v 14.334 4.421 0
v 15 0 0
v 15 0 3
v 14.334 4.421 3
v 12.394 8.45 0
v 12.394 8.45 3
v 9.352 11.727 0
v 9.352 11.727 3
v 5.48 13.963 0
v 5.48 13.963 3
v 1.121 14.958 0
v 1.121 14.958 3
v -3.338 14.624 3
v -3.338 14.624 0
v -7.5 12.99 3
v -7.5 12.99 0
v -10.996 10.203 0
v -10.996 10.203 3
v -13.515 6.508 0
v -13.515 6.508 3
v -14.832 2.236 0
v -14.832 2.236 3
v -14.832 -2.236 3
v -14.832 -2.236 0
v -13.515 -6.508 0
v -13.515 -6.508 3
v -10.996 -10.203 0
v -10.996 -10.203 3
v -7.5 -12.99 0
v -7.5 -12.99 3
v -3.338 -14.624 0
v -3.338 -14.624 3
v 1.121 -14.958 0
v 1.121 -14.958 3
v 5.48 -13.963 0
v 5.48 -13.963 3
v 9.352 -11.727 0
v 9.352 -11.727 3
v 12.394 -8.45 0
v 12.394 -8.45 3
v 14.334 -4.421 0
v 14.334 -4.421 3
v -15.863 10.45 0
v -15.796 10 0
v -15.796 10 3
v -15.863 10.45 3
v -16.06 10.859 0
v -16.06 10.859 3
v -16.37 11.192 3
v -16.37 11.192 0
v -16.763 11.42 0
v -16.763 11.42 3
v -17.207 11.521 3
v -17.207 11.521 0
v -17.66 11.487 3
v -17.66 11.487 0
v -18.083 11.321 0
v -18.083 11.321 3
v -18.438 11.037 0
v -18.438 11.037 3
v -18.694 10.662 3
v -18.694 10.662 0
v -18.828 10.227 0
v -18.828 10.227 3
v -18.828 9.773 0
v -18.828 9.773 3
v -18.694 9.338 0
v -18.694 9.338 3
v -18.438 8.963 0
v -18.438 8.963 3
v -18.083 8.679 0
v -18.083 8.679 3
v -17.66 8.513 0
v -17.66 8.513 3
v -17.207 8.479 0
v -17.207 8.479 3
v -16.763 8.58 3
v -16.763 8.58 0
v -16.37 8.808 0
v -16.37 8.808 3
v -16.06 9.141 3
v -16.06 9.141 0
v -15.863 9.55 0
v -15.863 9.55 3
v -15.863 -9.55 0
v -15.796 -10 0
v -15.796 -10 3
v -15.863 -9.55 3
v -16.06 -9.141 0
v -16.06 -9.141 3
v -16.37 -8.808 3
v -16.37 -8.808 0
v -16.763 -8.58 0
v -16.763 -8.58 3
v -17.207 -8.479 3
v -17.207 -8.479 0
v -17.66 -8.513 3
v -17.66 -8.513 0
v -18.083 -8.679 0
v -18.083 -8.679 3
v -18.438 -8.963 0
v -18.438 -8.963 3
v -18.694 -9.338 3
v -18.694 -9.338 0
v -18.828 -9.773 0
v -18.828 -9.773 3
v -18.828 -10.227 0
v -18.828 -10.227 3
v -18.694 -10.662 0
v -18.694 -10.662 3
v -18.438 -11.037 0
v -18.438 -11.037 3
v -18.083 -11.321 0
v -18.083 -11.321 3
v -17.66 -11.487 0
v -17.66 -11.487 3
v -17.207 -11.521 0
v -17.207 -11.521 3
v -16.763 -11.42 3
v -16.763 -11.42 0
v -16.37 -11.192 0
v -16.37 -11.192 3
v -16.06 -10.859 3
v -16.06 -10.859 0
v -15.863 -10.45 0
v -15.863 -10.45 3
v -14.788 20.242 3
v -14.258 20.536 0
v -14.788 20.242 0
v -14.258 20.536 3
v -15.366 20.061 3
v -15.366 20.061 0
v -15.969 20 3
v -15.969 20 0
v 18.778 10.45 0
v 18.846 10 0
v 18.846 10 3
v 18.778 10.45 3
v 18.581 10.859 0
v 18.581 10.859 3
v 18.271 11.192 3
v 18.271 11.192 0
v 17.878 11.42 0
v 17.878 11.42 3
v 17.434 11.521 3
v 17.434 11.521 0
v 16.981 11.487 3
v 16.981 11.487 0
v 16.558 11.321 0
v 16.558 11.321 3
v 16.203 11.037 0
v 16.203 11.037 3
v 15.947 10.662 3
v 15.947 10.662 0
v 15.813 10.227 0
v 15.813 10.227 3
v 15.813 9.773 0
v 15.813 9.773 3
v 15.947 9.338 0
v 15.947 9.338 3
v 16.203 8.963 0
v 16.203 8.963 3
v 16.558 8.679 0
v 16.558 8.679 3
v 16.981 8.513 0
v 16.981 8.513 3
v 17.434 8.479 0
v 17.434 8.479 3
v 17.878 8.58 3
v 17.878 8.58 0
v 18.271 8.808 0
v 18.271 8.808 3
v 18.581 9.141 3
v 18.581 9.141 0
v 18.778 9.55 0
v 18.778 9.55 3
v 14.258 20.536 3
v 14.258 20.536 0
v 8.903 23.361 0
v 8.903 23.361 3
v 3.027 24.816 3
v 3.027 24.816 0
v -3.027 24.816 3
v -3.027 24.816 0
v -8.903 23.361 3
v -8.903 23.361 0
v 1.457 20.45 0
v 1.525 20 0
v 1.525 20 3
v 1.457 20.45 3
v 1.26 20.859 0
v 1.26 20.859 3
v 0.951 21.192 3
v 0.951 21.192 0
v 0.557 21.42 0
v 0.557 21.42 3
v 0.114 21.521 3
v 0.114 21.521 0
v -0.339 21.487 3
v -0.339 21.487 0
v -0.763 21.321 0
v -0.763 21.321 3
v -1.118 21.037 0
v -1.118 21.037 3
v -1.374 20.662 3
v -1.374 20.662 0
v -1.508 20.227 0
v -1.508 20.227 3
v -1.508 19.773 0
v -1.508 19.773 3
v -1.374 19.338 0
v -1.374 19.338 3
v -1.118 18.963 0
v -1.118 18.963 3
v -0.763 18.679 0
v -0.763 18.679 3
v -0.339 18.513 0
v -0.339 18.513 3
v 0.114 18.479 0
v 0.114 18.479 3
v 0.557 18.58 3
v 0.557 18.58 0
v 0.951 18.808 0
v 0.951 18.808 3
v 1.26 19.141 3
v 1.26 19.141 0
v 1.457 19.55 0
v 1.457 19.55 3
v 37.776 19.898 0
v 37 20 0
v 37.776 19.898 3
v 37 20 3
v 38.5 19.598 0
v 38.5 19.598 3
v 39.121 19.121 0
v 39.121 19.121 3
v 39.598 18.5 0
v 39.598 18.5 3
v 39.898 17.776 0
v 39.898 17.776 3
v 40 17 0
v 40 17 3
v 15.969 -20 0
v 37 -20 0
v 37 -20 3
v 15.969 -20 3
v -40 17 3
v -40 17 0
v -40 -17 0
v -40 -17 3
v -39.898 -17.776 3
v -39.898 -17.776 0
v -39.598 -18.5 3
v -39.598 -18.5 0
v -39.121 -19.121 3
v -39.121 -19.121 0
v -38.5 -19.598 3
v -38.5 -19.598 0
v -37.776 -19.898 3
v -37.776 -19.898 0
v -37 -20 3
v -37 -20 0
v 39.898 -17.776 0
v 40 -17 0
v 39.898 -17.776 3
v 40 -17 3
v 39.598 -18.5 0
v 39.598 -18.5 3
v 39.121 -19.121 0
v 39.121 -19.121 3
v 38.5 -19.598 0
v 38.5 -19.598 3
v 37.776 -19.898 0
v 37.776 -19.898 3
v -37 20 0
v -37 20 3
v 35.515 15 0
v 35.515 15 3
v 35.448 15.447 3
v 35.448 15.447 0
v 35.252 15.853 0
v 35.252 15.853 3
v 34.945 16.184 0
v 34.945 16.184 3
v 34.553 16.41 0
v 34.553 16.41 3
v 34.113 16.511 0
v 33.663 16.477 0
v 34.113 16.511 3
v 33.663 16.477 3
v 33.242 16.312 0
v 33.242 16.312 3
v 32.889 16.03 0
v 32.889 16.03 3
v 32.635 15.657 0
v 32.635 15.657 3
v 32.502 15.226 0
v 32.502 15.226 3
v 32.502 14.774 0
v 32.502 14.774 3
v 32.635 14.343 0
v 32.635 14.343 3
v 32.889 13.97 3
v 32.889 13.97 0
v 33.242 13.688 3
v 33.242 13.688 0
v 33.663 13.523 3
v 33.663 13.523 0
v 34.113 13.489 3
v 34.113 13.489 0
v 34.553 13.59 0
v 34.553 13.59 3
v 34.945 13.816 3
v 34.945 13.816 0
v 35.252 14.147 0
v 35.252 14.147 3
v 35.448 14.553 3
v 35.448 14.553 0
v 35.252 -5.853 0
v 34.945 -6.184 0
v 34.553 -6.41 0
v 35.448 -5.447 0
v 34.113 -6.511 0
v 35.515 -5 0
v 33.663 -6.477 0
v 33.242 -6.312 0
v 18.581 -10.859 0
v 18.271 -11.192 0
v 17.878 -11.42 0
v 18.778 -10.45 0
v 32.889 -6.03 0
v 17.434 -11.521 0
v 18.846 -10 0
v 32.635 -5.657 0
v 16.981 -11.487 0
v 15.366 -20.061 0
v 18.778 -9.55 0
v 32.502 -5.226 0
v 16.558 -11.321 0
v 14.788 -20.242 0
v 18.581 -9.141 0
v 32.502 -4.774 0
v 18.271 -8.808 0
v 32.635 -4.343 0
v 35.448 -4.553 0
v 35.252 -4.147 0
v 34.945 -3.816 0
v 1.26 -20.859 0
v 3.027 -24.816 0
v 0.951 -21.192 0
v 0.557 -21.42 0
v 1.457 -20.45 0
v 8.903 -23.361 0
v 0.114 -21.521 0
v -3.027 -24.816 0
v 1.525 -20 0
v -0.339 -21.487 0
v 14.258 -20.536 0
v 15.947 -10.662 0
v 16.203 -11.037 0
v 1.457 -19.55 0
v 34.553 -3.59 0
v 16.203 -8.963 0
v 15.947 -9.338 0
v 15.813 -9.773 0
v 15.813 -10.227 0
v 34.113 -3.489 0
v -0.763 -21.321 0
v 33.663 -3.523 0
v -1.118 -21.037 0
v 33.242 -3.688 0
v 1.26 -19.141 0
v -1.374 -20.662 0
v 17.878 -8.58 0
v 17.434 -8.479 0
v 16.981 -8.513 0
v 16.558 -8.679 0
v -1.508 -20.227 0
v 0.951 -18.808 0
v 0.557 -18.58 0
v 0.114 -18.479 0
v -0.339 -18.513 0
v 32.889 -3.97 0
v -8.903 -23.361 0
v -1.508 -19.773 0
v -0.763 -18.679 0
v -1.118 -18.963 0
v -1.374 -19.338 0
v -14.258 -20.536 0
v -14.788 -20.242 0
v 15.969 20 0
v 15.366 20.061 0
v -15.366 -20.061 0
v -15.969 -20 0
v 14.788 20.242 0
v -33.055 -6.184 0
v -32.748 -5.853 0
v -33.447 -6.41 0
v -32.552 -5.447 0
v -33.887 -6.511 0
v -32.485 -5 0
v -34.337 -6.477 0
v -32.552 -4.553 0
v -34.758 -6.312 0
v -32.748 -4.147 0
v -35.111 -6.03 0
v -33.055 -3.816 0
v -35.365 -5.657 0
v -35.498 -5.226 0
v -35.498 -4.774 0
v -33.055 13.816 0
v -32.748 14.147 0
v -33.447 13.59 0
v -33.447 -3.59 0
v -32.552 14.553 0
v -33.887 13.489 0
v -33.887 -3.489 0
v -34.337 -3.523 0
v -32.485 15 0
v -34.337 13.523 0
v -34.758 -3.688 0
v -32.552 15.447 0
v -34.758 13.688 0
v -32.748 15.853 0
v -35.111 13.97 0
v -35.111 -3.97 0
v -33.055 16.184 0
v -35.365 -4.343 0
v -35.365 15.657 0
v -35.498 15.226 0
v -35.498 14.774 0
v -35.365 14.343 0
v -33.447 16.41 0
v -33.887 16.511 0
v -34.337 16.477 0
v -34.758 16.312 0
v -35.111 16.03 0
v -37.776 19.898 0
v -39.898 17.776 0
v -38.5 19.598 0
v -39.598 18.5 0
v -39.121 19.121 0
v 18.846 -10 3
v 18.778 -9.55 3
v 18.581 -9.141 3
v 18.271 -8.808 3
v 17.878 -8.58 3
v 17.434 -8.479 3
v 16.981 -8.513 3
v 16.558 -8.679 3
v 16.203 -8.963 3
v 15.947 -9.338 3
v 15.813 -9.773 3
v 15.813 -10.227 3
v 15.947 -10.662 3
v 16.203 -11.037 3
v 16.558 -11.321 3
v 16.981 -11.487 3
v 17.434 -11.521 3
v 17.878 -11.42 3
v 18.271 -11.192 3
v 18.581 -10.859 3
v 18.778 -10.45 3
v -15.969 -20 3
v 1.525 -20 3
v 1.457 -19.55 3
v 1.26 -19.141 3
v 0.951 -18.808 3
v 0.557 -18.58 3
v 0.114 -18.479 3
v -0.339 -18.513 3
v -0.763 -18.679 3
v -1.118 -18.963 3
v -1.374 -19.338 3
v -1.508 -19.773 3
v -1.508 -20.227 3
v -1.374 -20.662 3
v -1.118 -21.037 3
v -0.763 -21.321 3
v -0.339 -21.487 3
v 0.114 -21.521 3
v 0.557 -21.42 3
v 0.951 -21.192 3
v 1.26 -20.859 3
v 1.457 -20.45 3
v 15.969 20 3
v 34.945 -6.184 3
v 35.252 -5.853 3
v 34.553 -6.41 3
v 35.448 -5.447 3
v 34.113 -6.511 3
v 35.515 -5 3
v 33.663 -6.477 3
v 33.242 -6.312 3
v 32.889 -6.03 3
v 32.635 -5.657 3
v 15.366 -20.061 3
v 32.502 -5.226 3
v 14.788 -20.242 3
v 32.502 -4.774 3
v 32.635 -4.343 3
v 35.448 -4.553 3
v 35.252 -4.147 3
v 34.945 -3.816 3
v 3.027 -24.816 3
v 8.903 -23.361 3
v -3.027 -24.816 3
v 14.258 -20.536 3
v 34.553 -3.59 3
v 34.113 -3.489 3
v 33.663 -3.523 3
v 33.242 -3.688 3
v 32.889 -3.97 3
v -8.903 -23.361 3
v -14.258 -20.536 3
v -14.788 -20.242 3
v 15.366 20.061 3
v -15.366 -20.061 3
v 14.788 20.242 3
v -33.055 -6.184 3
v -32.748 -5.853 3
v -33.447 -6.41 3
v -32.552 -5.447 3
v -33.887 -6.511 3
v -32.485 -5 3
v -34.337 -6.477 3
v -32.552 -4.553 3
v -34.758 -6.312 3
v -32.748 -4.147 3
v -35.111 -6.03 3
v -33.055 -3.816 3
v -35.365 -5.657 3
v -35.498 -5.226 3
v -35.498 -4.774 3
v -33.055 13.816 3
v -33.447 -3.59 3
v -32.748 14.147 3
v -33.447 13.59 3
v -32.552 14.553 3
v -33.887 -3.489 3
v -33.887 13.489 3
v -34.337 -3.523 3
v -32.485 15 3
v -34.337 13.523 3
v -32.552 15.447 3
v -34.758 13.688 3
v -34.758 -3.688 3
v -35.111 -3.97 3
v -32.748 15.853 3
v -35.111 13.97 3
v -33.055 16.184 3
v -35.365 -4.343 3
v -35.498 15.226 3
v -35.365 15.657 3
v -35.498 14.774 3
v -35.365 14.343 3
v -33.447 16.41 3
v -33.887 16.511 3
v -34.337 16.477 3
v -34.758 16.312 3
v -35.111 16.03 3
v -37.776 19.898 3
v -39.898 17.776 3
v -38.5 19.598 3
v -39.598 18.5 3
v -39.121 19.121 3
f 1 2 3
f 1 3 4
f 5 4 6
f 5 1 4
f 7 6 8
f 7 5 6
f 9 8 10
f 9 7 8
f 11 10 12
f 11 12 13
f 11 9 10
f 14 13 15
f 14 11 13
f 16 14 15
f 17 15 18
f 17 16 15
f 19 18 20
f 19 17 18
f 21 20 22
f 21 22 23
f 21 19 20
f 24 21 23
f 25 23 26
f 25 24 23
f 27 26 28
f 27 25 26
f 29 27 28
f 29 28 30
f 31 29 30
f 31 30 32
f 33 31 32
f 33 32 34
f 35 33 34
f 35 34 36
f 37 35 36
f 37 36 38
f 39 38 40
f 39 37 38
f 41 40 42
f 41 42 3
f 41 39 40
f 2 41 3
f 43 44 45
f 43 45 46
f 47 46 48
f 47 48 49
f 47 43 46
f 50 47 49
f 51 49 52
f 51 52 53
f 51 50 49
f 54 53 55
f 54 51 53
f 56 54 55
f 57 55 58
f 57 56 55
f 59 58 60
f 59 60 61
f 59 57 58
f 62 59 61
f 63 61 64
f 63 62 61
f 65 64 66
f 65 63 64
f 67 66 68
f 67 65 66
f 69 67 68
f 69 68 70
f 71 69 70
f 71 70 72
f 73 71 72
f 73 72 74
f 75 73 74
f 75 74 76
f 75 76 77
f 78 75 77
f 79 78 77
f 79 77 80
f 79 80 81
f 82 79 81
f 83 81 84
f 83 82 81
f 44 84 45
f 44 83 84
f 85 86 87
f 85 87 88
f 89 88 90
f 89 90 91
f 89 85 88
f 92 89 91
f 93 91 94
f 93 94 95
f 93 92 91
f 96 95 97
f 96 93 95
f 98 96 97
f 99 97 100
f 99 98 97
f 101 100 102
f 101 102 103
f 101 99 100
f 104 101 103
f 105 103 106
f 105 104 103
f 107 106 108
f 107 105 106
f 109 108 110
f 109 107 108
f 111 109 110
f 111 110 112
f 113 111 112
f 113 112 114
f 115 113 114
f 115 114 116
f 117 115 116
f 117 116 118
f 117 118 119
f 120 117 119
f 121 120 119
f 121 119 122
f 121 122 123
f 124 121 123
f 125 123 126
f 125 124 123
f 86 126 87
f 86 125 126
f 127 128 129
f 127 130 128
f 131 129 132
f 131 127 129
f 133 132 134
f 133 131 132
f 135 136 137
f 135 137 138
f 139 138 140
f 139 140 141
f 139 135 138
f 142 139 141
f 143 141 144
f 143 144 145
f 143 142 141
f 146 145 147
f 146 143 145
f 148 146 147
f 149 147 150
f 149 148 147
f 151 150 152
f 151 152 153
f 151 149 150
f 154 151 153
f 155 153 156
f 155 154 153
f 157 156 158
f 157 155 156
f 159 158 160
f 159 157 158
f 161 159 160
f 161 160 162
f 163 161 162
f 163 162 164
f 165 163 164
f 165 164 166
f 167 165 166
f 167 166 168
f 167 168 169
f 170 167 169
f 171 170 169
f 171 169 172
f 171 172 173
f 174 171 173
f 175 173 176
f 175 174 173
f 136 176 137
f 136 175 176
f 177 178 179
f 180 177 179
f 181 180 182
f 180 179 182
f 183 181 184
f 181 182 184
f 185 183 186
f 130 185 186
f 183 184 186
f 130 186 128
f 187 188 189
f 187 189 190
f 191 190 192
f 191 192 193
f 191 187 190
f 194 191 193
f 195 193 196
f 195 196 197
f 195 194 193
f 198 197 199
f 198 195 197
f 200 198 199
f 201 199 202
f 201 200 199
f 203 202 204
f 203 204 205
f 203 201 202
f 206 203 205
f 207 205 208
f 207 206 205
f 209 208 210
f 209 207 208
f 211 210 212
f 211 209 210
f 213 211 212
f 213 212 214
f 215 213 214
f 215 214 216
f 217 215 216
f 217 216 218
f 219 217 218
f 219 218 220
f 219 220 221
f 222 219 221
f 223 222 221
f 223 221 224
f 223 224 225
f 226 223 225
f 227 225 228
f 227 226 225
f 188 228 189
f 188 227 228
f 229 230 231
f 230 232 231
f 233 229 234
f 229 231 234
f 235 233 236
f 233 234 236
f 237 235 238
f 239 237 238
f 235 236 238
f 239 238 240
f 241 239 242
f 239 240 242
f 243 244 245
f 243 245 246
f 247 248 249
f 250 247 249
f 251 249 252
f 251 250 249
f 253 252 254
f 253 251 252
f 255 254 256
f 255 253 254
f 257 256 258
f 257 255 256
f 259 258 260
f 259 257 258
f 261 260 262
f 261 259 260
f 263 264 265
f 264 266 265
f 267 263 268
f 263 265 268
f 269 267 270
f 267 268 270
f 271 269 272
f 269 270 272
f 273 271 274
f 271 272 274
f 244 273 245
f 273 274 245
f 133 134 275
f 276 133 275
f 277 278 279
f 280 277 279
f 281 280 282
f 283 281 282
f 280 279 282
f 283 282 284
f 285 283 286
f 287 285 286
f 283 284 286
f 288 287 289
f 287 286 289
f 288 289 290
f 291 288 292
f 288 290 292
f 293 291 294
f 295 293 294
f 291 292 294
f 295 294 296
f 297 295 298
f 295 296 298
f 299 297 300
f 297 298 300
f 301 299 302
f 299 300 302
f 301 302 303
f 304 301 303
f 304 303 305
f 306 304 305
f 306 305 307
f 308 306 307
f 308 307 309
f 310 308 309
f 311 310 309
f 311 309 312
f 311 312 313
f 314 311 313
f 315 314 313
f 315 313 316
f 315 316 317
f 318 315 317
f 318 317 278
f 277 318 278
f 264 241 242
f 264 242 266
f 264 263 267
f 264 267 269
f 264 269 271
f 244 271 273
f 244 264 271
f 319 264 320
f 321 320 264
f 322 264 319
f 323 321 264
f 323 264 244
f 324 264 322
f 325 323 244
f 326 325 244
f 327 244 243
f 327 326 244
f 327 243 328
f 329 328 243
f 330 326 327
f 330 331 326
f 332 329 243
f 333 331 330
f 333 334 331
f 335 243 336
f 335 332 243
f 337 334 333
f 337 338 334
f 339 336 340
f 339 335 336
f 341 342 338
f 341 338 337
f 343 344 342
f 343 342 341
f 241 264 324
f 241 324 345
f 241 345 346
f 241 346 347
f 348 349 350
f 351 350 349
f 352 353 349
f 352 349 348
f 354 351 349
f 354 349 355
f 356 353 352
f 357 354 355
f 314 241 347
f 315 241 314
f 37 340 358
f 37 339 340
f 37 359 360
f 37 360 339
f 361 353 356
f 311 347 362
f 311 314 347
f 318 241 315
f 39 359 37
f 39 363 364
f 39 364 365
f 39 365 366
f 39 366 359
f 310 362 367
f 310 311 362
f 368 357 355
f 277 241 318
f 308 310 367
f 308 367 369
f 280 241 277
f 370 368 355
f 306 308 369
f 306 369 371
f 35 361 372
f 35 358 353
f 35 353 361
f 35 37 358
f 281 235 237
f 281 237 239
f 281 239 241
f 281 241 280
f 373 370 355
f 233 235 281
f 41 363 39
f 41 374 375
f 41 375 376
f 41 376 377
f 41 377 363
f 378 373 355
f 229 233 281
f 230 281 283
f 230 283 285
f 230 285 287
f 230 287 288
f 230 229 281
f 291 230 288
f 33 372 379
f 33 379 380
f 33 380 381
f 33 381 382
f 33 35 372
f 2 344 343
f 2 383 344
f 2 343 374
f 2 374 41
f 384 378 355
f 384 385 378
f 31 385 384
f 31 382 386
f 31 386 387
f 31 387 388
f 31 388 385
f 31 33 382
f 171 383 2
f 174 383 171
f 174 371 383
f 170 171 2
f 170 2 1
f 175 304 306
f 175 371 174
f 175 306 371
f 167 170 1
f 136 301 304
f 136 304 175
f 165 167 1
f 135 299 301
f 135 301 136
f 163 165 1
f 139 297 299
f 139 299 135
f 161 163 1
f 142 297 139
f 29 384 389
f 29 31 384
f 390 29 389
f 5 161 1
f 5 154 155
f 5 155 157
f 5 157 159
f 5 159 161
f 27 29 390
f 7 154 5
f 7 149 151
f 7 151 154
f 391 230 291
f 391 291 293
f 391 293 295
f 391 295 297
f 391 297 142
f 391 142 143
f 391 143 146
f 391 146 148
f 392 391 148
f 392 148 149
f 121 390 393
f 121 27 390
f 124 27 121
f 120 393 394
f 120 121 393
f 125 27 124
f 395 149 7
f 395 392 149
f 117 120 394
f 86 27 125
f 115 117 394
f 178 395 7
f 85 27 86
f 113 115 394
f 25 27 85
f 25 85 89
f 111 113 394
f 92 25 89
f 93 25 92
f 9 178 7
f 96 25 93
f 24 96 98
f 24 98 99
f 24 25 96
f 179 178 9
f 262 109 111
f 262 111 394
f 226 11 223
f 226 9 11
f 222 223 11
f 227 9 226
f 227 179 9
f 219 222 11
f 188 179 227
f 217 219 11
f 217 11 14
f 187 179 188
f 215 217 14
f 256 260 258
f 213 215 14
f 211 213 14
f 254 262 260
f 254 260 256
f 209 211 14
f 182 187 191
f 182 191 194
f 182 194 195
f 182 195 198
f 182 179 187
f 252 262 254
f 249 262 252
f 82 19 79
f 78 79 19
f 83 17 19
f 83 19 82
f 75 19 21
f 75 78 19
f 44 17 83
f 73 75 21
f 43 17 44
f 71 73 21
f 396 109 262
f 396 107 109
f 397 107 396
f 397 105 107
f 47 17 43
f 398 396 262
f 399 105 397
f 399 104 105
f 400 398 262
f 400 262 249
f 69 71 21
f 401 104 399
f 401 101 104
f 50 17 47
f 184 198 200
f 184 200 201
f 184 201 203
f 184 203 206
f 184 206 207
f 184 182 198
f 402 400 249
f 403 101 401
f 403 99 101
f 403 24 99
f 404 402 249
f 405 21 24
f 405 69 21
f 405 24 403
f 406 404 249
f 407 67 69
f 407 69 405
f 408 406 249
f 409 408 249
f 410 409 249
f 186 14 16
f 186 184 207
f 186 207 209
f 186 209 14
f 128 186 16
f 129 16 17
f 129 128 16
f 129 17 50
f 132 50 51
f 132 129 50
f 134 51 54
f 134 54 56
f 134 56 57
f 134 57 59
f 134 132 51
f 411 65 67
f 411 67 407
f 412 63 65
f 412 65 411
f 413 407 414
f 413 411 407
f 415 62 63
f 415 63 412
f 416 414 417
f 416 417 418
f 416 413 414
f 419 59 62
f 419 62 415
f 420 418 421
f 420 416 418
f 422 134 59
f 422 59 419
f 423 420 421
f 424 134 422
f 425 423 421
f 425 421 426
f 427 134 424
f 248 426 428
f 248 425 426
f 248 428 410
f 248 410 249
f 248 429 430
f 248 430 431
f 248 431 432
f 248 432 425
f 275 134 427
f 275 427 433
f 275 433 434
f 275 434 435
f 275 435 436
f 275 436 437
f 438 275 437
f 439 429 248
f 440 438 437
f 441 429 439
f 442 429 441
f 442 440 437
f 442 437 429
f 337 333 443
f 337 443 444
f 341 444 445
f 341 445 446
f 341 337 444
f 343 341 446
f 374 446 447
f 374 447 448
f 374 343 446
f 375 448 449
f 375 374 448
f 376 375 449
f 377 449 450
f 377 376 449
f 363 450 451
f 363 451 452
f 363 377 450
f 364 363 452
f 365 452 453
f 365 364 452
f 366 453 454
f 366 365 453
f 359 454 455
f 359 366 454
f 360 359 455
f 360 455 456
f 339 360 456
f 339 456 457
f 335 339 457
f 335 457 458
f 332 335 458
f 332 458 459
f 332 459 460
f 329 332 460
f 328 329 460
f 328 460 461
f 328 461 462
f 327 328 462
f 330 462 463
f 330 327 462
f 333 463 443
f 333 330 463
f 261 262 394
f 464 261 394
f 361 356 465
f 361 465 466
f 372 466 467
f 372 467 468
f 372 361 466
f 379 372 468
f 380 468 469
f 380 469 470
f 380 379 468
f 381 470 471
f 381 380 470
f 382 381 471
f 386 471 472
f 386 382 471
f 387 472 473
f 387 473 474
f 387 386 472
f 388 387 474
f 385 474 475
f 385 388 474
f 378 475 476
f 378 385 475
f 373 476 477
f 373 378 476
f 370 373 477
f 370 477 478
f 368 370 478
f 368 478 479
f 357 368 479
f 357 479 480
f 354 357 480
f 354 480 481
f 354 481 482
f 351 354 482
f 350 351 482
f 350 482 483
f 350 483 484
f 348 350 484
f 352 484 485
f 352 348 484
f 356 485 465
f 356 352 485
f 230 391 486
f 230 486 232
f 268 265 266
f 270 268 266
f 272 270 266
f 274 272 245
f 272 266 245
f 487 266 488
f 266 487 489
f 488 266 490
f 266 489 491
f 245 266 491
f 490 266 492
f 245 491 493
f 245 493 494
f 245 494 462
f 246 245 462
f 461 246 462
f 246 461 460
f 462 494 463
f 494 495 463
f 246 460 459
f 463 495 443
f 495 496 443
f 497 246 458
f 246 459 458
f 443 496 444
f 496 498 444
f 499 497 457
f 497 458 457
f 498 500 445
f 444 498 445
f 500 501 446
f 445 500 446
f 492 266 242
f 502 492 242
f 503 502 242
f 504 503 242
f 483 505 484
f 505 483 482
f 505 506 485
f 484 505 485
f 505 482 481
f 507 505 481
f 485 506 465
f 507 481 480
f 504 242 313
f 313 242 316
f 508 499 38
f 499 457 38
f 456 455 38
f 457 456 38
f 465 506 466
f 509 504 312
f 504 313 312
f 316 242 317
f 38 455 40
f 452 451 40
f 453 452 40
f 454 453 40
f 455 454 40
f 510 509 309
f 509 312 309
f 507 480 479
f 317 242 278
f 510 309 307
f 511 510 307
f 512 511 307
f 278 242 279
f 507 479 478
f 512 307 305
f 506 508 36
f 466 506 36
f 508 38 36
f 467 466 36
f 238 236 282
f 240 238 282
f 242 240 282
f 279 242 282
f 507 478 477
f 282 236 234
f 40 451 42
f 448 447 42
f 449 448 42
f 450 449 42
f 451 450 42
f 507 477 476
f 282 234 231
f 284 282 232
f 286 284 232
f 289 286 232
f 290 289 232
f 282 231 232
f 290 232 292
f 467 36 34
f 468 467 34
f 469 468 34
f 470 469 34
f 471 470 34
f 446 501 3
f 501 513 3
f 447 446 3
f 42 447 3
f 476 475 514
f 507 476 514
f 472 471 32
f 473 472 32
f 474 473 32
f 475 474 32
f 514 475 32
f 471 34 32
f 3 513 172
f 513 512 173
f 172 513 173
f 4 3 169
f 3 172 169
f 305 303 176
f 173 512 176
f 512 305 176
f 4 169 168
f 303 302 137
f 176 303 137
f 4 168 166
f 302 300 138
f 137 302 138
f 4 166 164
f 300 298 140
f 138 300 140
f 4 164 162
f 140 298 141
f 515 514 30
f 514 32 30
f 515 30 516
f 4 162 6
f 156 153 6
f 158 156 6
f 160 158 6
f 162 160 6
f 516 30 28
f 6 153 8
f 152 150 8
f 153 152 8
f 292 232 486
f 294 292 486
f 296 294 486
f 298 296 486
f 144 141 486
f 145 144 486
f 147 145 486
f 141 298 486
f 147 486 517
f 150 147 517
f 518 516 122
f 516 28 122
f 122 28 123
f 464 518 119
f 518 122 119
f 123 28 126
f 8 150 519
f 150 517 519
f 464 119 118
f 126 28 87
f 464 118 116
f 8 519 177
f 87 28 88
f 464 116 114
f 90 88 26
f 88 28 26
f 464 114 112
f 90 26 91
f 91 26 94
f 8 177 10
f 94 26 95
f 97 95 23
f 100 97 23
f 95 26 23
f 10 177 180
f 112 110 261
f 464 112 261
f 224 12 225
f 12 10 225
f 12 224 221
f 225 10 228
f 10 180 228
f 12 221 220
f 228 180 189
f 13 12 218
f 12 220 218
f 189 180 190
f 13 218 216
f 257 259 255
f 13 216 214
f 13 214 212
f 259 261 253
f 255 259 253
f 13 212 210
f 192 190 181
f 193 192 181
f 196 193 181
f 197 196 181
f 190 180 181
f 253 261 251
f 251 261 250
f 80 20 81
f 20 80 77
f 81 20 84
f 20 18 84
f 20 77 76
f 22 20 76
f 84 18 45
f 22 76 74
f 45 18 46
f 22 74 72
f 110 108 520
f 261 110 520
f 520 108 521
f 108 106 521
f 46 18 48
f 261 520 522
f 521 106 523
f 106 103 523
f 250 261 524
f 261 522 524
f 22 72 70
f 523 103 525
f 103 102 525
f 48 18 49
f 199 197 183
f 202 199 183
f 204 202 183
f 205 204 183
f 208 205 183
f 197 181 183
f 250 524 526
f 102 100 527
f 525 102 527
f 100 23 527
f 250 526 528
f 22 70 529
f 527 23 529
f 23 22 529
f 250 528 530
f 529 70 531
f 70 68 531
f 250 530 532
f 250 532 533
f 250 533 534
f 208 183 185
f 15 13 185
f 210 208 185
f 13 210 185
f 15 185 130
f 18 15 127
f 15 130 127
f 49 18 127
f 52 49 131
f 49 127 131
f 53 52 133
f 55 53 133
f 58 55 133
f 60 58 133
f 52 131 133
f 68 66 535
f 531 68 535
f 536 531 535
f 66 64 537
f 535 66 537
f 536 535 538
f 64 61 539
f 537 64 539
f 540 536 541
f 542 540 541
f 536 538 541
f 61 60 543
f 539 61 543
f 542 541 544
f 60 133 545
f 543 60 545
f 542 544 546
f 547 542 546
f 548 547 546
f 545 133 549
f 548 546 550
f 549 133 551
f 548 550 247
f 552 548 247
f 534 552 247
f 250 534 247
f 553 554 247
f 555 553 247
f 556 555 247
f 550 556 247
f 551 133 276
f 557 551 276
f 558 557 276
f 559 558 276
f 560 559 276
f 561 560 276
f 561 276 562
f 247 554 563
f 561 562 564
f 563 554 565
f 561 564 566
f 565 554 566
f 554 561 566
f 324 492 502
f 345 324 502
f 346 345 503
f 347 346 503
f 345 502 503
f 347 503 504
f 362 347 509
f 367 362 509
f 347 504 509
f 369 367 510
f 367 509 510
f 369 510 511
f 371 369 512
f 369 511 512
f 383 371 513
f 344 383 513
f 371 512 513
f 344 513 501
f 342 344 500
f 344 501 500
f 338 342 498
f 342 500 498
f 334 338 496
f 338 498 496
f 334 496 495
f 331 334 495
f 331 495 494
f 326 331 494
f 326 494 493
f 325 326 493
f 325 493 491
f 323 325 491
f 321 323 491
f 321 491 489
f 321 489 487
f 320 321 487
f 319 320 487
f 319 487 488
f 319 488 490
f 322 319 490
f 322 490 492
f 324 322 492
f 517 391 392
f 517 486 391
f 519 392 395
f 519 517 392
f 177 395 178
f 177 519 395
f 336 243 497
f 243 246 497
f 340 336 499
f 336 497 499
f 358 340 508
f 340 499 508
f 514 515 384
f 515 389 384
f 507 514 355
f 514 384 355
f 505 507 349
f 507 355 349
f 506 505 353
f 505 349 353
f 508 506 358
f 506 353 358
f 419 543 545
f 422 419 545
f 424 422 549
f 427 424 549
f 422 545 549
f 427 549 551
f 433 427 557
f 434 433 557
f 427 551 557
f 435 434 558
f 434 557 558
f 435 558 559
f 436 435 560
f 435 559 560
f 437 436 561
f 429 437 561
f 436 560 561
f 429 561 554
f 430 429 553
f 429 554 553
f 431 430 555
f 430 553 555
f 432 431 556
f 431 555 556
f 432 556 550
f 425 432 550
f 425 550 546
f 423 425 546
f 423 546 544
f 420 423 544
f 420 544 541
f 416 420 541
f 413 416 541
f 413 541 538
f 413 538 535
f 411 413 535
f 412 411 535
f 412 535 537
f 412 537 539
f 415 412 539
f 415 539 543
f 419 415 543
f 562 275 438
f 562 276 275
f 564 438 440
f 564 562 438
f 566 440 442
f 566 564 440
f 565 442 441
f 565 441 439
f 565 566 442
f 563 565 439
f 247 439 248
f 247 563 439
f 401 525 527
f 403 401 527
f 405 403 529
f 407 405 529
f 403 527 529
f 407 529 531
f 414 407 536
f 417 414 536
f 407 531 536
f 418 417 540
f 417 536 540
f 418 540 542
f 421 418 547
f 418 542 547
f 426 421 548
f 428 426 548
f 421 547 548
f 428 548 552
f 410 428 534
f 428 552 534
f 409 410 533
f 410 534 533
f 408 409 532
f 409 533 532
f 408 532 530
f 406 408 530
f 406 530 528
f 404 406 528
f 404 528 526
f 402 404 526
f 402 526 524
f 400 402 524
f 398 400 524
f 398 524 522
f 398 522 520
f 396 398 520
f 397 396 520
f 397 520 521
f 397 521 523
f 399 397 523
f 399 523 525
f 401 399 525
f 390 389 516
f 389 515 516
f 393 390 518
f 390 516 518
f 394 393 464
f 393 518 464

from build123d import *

# Parameters (mm, degrees)
SKETCH_1_R          = 25
SKETCH_1_R_2        = 1.525
SKETCH_1_R_3        = 15
EXTRUDE_1_DEPTH     = 3
EXTRUDE_START       = -3
EXTRUDE_2_DEPTH     = 3
FILLET_1_R          = 3
SKETCH_4_R          = 1.515
CUT_EXTRUDE_1_DEPTH = 10


with BuildPart() as part:
    # 草图1 → 凸台-拉伸1 (new body)
    with BuildSketch(Plane.XY):
        Circle(SKETCH_1_R)
        with Locations((0, 20)):
            Circle(SKETCH_1_R_2, mode=Mode.SUBTRACT)
        with Locations((17.320508076, 10)):
            Circle(SKETCH_1_R_2, mode=Mode.SUBTRACT)
        with Locations((17.320508076, -10)):
            Circle(SKETCH_1_R_2, mode=Mode.SUBTRACT)
        with Locations((0, -20)):
            Circle(SKETCH_1_R_2, mode=Mode.SUBTRACT)
        with Locations((-17.320508076, -10)):
            Circle(SKETCH_1_R_2, mode=Mode.SUBTRACT)
        with Locations((-17.320508076, 10)):
            Circle(SKETCH_1_R_2, mode=Mode.SUBTRACT)
        Circle(SKETCH_1_R_3, mode=Mode.SUBTRACT)
    extrude(amount=EXTRUDE_1_DEPTH)

    # 草图3 → 凸台-拉伸2 (add)
    with BuildSketch(Plane.XY.offset(3).offset(EXTRUDE_START)):
        with BuildLine():
            Line((15, 20), (40, 20))
            Line((40, 20), (40, -20))
            Line((40, -20), (15, -20))
            ThreePointArc((15, -20), (25, 0), (15, 20))
        make_face()
        with BuildLine():
            Line((-40, -20), (-15, -20))
            ThreePointArc((-15, -20), (-25, 0), (-15, 20))
            Line((-15, 20), (-40, 20))
            Line((-40, 20), (-40, -20))
        make_face()
    extrude(amount=EXTRUDE_2_DEPTH)

    # 圆角1
    fillet_1_edges = [part.edges().sort_by_distance(p)[0] for p in [
        (40, 20, 1.5),
        (40, -20, 1.5),
        (15, -20, 1.5),
        (15, 20, 1.5),
        (-40, -20, 1.5),
        (-40, 20, 1.5),
        (-15, 20, 1.5),
        (-15, -20, 1.5),
    ]]
    fillet(fillet_1_edges, radius=FILLET_1_R)

    # 草图4 → 切除-拉伸1 (cut)
    with BuildSketch(Plane.XY.offset(3)):
        with Locations((-34, 15)):
            Circle(SKETCH_4_R)
        with Locations((-34, -5)):
            Circle(SKETCH_4_R)
        with Locations((34, -5)):
            Circle(SKETCH_4_R)
        with Locations((34, 15)):
            Circle(SKETCH_4_R)
    extrude(amount=-CUT_EXTRUDE_1_DEPTH, mode=Mode.SUBTRACT)


solid = part.part
